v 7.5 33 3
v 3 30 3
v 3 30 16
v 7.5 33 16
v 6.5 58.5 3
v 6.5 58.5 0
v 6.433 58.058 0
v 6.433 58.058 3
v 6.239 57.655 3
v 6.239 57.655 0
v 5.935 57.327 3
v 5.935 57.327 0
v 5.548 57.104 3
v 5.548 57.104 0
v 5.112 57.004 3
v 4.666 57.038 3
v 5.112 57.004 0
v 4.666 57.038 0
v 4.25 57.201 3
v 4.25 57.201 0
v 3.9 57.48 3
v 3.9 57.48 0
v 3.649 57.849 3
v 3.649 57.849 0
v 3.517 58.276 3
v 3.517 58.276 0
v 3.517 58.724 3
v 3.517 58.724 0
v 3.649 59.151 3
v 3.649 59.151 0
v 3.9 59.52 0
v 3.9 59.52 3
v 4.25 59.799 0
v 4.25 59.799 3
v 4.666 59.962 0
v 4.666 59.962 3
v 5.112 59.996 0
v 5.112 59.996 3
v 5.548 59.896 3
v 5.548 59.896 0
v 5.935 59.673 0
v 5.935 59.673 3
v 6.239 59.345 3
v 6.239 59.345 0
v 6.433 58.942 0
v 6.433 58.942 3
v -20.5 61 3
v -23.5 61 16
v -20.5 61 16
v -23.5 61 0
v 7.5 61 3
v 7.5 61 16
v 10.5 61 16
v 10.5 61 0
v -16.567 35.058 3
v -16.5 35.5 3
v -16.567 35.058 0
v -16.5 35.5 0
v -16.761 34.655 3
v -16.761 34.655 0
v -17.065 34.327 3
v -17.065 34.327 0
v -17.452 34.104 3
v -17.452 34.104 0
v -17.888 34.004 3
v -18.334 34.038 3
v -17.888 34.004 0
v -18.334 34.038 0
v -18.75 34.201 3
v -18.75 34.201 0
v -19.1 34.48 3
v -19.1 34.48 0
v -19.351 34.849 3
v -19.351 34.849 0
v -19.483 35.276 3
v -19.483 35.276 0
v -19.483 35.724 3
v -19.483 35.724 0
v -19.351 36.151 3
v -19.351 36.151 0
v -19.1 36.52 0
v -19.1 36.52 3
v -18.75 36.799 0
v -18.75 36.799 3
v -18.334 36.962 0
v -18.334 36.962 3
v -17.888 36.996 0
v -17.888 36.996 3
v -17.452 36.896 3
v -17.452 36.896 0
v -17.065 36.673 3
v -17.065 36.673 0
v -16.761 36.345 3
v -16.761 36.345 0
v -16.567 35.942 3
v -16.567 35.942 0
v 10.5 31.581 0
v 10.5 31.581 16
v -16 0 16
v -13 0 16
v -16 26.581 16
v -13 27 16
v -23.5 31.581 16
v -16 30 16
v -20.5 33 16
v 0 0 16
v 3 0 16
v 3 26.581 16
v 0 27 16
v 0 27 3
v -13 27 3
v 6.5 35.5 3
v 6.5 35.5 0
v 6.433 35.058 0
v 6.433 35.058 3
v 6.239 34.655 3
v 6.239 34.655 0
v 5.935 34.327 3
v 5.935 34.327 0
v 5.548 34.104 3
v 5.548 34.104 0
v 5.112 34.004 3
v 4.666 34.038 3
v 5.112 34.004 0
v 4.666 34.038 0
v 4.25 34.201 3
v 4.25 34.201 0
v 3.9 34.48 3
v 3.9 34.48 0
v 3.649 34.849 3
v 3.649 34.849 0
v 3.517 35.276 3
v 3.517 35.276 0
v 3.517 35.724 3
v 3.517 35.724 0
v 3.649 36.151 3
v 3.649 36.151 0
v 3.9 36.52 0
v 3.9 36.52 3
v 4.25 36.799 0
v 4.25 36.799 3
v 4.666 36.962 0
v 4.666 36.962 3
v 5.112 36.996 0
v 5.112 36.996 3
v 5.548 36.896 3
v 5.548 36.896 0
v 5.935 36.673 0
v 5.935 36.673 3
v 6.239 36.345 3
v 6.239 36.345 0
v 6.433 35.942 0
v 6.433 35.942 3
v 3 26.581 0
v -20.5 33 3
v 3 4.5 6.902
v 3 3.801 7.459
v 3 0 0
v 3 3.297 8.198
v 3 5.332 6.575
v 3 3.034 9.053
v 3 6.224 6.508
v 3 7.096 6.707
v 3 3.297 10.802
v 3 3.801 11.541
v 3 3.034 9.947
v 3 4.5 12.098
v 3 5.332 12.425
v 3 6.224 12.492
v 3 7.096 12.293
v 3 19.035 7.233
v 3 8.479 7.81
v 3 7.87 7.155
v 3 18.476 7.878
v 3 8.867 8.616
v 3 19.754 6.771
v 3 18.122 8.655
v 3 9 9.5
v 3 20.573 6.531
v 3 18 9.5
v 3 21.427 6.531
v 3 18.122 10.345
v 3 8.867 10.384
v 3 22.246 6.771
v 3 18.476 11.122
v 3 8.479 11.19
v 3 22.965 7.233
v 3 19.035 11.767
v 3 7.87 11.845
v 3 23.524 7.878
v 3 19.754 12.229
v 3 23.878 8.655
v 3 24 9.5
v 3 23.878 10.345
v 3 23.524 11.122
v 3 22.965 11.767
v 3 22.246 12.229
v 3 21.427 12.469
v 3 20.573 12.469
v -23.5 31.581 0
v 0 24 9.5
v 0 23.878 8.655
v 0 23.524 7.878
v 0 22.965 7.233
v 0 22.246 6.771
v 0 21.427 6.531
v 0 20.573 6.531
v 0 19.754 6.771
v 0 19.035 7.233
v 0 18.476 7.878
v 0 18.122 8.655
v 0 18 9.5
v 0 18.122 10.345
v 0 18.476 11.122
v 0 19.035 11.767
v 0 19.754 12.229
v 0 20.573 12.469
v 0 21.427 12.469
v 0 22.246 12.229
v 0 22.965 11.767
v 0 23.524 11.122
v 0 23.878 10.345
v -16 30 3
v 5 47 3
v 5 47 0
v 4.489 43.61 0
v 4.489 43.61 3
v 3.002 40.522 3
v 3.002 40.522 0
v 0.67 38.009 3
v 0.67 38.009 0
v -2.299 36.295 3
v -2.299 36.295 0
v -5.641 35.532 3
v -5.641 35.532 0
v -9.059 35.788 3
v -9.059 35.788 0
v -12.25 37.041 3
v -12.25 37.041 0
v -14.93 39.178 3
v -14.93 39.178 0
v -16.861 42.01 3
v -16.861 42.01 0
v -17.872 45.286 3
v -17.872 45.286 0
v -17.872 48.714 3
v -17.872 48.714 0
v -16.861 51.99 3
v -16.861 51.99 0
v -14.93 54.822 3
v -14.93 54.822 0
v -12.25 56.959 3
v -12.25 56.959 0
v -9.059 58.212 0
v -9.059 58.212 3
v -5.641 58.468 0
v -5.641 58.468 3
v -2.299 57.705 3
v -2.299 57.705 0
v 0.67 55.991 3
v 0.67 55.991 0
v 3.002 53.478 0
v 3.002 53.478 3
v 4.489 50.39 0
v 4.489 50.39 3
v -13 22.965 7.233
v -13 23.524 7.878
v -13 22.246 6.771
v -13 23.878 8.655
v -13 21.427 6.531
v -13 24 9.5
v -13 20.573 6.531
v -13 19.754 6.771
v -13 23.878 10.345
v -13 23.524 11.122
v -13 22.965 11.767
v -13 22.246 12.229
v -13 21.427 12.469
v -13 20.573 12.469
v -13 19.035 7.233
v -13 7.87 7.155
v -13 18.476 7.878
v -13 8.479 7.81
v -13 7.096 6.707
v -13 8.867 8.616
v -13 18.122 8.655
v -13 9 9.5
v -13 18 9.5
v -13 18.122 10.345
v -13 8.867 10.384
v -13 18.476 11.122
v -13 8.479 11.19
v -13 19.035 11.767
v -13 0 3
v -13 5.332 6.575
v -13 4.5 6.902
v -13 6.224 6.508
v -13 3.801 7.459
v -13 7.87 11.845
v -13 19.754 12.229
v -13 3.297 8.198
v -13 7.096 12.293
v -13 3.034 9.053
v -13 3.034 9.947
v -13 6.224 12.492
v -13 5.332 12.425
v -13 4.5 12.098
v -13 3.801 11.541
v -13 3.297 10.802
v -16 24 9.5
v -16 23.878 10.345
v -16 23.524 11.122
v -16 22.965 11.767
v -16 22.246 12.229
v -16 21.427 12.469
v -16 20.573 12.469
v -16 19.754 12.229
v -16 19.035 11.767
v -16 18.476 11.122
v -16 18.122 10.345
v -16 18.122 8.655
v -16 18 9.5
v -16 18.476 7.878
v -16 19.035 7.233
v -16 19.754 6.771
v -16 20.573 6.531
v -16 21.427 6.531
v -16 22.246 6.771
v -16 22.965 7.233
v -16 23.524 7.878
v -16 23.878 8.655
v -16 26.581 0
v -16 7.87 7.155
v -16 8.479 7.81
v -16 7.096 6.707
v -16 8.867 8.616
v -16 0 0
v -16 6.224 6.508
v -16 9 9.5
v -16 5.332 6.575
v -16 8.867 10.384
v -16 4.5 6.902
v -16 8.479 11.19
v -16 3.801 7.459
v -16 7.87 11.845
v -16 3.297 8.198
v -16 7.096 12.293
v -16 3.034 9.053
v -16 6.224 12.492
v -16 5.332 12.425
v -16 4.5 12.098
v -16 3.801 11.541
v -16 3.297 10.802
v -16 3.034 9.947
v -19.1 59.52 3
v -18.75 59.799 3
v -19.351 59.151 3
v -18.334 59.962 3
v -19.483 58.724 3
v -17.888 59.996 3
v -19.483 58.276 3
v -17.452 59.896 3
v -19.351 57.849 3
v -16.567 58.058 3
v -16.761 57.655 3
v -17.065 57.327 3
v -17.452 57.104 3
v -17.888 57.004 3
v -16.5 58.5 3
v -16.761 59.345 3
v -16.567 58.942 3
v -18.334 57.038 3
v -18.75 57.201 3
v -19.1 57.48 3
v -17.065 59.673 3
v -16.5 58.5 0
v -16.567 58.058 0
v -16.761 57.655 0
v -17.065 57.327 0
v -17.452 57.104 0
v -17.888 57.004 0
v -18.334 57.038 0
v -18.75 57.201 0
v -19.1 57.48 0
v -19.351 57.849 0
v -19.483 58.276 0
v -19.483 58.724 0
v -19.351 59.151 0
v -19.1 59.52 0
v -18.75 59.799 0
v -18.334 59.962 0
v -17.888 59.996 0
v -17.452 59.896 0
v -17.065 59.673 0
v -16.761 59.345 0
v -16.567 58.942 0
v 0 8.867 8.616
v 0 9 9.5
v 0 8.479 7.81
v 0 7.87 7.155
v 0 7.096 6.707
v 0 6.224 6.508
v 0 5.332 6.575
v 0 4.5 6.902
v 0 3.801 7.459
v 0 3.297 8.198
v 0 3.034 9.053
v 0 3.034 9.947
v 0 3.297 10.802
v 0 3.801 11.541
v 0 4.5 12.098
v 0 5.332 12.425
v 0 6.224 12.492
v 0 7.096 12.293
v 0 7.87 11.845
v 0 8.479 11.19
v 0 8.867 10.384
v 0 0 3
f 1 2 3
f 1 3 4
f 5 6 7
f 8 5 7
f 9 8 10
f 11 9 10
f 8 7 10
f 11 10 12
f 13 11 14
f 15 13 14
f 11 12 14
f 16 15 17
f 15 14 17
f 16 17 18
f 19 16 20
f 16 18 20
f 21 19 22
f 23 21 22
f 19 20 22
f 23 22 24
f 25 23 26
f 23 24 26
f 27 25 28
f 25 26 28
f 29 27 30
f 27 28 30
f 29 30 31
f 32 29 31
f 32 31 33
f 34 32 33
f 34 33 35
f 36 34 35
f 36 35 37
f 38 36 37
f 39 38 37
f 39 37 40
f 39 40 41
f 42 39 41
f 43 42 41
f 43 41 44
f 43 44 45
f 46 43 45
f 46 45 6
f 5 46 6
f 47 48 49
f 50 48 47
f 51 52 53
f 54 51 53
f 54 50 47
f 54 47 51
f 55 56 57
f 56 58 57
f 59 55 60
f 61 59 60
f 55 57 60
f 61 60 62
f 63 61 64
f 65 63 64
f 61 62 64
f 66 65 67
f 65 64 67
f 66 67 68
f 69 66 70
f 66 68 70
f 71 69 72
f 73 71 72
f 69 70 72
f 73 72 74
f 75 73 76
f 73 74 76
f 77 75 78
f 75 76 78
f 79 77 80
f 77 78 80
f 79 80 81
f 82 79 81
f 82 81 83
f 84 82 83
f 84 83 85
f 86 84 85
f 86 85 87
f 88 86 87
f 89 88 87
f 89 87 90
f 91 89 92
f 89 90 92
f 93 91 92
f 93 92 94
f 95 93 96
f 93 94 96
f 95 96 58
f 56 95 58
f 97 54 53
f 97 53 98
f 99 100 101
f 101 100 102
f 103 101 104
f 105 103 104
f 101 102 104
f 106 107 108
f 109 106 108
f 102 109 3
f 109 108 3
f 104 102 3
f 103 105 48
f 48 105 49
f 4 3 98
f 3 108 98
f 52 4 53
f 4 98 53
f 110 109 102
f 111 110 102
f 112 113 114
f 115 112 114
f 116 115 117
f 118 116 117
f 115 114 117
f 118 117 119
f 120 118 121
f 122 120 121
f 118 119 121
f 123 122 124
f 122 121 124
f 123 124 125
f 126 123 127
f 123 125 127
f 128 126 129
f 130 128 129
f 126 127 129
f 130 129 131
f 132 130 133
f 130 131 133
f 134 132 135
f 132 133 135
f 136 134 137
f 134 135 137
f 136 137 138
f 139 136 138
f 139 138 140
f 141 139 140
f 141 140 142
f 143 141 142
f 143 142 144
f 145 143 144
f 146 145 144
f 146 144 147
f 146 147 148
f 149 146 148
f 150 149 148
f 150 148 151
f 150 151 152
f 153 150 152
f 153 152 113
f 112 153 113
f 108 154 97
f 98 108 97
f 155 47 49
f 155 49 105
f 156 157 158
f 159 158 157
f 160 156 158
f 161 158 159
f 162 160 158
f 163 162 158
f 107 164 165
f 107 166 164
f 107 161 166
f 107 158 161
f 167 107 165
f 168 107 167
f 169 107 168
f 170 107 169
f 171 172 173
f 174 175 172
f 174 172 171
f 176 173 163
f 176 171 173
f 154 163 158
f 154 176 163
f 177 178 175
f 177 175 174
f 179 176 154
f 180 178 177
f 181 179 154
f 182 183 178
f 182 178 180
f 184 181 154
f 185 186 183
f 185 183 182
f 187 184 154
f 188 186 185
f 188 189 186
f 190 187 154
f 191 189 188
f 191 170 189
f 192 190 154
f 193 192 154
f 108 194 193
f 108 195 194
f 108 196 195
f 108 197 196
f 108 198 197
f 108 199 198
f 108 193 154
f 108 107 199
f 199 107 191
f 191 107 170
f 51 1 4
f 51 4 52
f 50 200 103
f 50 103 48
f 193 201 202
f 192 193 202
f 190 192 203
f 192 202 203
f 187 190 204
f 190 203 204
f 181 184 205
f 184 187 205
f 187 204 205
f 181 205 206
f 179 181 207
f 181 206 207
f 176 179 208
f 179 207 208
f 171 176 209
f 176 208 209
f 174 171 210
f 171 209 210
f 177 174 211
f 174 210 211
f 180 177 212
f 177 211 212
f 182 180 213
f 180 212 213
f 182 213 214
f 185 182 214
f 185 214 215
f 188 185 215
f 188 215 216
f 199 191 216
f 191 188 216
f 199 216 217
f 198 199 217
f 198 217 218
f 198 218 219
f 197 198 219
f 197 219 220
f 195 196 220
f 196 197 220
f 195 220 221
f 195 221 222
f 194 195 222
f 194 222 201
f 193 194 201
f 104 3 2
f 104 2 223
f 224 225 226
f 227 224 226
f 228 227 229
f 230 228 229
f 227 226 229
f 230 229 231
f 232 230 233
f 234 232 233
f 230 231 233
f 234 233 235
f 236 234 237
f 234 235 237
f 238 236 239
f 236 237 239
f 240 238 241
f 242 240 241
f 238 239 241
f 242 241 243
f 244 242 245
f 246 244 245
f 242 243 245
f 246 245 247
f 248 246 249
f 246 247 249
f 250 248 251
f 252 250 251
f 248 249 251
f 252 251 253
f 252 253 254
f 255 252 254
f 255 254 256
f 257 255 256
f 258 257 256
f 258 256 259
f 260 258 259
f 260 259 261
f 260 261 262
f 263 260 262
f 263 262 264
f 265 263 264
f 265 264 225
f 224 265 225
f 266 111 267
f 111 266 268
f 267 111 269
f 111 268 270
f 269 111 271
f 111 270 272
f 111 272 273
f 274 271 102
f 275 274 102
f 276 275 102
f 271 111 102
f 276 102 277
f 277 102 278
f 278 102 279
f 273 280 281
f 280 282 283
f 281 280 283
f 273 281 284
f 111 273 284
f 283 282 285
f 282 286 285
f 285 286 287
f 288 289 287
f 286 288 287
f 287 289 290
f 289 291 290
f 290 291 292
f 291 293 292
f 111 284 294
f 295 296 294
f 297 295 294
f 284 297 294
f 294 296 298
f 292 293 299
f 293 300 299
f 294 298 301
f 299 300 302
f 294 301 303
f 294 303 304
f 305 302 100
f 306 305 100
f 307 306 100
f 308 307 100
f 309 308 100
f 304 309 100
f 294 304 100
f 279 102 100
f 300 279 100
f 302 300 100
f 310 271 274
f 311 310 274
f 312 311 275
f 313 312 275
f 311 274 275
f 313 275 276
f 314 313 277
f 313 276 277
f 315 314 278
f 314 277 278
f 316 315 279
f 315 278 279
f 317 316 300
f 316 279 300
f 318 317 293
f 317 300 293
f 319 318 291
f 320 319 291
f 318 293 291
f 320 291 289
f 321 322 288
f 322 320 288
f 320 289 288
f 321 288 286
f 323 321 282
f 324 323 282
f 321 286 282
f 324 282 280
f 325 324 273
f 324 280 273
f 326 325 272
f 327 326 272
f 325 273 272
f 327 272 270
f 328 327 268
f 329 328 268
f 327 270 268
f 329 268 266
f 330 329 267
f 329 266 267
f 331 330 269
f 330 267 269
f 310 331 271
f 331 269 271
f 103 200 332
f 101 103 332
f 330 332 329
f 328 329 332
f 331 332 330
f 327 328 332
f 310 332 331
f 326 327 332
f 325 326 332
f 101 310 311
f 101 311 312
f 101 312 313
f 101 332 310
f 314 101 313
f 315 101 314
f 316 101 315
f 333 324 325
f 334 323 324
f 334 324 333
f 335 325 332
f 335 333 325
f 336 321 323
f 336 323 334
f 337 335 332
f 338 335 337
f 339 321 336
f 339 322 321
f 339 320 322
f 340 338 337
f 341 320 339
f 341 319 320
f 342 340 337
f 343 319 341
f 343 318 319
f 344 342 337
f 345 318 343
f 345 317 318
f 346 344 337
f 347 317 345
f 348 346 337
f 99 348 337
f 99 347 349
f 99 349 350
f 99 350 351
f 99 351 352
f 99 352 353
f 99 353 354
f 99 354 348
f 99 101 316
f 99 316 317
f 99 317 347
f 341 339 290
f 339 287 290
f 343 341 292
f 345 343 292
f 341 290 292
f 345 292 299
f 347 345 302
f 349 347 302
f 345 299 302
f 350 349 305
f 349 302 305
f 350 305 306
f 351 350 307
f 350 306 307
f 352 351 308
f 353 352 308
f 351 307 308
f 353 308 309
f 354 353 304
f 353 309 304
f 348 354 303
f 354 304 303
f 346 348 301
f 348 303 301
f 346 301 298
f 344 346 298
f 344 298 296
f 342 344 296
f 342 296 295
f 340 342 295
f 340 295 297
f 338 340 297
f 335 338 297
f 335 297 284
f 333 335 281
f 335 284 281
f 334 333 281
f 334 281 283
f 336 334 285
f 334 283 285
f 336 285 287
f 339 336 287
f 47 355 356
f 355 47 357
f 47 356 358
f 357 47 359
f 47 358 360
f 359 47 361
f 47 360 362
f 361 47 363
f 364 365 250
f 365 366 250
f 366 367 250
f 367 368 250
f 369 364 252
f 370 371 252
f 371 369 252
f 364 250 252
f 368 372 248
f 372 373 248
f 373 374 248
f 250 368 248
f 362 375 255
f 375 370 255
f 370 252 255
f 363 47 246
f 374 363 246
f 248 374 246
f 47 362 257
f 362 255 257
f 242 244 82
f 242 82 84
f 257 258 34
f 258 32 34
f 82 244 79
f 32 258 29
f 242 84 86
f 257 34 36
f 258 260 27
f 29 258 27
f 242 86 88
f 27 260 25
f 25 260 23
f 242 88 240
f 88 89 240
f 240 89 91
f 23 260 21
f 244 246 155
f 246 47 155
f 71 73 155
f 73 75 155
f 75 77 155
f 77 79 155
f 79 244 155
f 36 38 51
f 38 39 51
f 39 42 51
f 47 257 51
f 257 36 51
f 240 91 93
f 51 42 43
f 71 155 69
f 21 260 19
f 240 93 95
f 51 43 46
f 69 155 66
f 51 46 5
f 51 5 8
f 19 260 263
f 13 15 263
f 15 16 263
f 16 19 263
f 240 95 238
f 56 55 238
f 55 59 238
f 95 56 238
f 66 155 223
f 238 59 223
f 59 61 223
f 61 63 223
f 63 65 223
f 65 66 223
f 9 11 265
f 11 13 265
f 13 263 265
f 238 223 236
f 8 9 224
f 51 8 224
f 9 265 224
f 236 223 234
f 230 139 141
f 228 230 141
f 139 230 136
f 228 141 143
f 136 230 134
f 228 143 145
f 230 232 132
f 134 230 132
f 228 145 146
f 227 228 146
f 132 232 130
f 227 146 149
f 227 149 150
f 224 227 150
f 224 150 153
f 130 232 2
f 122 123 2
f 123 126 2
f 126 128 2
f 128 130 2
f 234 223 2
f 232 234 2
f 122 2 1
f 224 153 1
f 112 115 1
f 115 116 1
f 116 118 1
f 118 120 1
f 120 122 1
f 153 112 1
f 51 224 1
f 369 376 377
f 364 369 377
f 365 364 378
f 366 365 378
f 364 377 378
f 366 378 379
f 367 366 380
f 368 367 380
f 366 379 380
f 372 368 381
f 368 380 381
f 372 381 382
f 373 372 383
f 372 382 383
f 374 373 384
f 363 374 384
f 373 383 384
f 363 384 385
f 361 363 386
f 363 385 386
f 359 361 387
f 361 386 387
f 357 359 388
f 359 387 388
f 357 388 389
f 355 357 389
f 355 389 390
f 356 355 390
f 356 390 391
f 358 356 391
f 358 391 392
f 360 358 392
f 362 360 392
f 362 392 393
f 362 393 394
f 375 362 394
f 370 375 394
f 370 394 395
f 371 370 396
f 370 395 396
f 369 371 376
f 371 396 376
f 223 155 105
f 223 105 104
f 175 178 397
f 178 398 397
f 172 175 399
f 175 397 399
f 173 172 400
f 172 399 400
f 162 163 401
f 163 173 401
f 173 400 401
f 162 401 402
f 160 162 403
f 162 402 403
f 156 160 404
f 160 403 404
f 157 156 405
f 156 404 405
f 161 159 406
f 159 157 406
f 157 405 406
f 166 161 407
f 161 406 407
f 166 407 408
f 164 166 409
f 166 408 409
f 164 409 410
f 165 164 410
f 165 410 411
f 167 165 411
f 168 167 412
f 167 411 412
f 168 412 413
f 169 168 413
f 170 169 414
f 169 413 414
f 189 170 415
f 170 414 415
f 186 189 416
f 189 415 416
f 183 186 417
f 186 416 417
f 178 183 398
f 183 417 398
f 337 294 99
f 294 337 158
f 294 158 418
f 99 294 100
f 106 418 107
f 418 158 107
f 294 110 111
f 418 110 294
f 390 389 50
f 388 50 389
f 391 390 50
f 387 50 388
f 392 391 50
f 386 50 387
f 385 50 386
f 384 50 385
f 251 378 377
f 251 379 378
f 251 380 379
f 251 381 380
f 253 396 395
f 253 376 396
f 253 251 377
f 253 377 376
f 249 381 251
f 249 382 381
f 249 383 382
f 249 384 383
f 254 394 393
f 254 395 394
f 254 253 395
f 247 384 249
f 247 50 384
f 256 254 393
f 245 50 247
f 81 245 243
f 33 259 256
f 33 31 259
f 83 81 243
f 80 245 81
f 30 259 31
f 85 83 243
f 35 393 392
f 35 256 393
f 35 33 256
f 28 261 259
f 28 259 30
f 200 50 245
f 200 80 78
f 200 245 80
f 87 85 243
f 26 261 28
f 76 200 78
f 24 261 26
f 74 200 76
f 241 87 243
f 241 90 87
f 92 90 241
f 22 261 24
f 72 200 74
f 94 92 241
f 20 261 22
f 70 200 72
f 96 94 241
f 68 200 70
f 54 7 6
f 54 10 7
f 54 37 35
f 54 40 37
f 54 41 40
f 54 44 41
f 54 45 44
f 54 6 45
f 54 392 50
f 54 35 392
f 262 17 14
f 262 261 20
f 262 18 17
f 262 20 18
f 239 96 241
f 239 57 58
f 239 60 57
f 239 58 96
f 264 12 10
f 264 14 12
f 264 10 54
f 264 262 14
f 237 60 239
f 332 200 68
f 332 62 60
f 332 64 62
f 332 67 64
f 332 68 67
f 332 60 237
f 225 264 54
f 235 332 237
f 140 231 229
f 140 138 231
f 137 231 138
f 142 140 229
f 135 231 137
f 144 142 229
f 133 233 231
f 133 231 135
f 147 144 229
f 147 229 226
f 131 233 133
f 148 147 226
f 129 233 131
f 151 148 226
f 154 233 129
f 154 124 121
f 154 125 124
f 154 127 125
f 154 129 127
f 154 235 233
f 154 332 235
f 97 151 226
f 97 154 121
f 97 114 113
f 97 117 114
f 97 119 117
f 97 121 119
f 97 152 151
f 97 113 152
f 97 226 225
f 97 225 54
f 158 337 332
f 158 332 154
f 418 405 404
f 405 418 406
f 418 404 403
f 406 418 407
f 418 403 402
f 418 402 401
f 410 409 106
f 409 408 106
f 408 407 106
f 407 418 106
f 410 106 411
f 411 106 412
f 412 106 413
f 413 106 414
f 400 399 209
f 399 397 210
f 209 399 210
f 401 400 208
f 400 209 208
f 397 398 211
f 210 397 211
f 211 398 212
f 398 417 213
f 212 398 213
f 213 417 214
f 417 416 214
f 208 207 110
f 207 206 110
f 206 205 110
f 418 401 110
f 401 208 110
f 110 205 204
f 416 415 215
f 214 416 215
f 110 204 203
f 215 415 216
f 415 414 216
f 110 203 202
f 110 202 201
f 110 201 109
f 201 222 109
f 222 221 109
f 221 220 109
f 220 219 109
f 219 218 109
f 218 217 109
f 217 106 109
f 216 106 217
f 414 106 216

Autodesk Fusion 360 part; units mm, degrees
sketch "Sketch1" plane through (0, 0, 0) normal (1, 0, 0) x (0, 1, 0)
  line L0 (0, 0) -> (27, 0)
  line L1 (27, 0) -> (27, 16)
  line L2 (27, 16) -> (0, 16)
  line L3 (0, 16) -> (0, 0)
  line L4 (0, 9.5) -> (6, 9.5) construction
  line L5 (6, 9.5) -> (6, 16) construction
  circle A0 centre (6, 9.5) radius 3
  line L6 (6, 9.5) -> (21, 9.5)
  circle A1 centre (21, 9.5) radius 3
  dimension "d1_4" = 16
  dimension "d2_4" = 27
  dimension "d3_4" = 6
  dimension "d4_4" = 6.5
  dimension "d5_2" = 6
  dimension "d6_1" = 15
  dimension "d7_2" = 6
extrude "Extrude1" add sketch "Sketch1" along normal blind 3 makes body 1
sketch "Sketch2" plane through (0, 0, 0) normal (-1, 0, 0) x (0, -1, 0)
  circle A0 centre (-21, 9.5) radius 3
  circle A1 centre (-6, 9.5) radius 3
  line L0 (0, 0) -> (0, 16)
  line L1 (0, 16) -> (-27, 16)
  line L2 (-27, 16) -> (-27, 0)
  line L3 (-27, 0) -> (0, 0)
  line L4 (0, 0) -> (-27, 0)
  line L5 (-27, 0) -> (-27, 3)
  line L6 (-27, 3) -> (0, 3)
  line L7 (0, 3) -> (0, 0)
  dimension "d10_1" = 3
extrude "Extrude2" add sketch "Sketch2" along normal blind 13 contours L0 L2 L3 L4 L5 L6 L7 bodies 1
ref_plane "WorkPlane1" through (-6.5, 13.5, 1.5) normal (-1, 0, 0) x (0, 0, 1)
mirror "Mirror1" about plane through (-6.5, 13.5, 1.5) normal (-1, 0, 0) of "Extrude1" makes body 2
combine "Combine1" operation add target body 1 tool bodies 2
sketch "Sketch3" plane through (0, 27, 0) normal (0, 1, 0) x (-1, 0, 0)
  line L0 (0, 3) -> (0, 16)
  line L1 (0, 16) -> (-3, 16)
  line L2 (-3, 16) -> (-3, 0)
  line L3 (-3, 0) -> (16, 0)
  line L4 (16, 0) -> (16, 16)
  line L5 (16, 16) -> (13, 16)
  line L6 (13, 16) -> (13, 3)
  line L7 (13, 3) -> (0, 3)
  line L8 (-3, 16) -> (16, 16)
  line L9 (16, 16) -> (16, 0)
  line L10 (16, 0) -> (-3, 0)
  line L11 (-3, 0) -> (-3, 16)
extrude "Extrude3" add sketch "Sketch3" along normal blind 3 bodies 1
sketch "Sketch4" plane through (0, 0, 0) normal (0, 0, -1) x (1, 0, 0)
  line L0 (3, -30) -> (3, 0)
  line L1 (3, 0) -> (-16, 0)
  line L2 (-16, 0) -> (-16, -30)
  line L3 (-16, -30) -> (3, -30)
  line L4 (-6.5, -30) -> (-6.5, -33) construction
  line L5 (7.5, -33) -> (-20.5, -33) construction
  line L6 (-20.5, -33) -> (-20.5, -61)
  line L7 (-20.5, -61) -> (7.5, -61)
  line L8 (7.5, -61) -> (7.5, -33)
  line L9 (-16, -30) -> (-20.5, -33)
  line L10 (3, -30) -> (7.5, -33)
  circle A0 centre (-6.5, -47) radius 11.5
  line L11 (7.5, -33) -> (-20.5, -61) construction
  line L12 (7.5, -61) -> (-20.5, -33) construction
  dimension "d23" = 28
  dimension "d24" = 28
  dimension "d25" = 3
  dimension "d28" = 23
extrude "Extrude4" add sketch "Sketch4" against normal blind 3 contours L3 L6 L7 L8 L9 L10 bodies 1
sketch "Sketch5" plane through (0, 0, 0) normal (0, 0, -1) x (1, 0, 0)
  circle A0 centre (-6.5, -47) radius 11.5
  line L0 (3, -30) -> (3, 0)
  line L1 (3, 0) -> (-16, 0)
  line L2 (-16, 0) -> (-16, -30)
  line L3 (-16, -30) -> (-20.5, -33)
  line L4 (-20.5, -33) -> (-20.5, -61)
  line L5 (-20.5, -61) -> (7.5, -61)
  line L6 (7.5, -61) -> (7.5, -33)
  line L7 (7.5, -33) -> (3, -30)
  line L8 (7.5, -61) -> (-20.5, -61)
  line L9 (-20.5, -61) -> (-20.5, -33)
  line L10 (-20.5, -33) -> (7.5, -33)
  line L11 (7.5, -33) -> (7.5, -61)
  line L12 (5, -58.5) -> (-18, -58.5) construction
  line L13 (-18, -58.5) -> (-18, -35.5) construction
  line L14 (-18, -35.5) -> (5, -35.5) construction
  line L15 (5, -35.5) -> (5, -58.5) construction
  circle A1 centre (5, -58.5) radius 1.5
  circle A2 centre (-18, -58.5) radius 1.5
  circle A3 centre (5, -35.5) radius 1.5
  circle A4 centre (-18, -35.5) radius 1.5
  dimension "d29" = 23
  dimension "d30" = 23
  dimension "d31" = 2.5
  dimension "d32" = 2.5
  dimension "d33" = 2.5
  dimension "d34" = 2.5
  dimension "d35" = 3
  dimension "d36" = 3
  dimension "d37" = 3
  dimension "d38" = 3
extrude "Extrude5" cut sketch "Sketch5" against normal up to surface (3 mm away) contours A1 | A2 | A3 | A4 bodies 1
sketch "Sketch10" plane through (0, 0, 3) normal (0, 0, 1) x (-1, 0, 0)
  circle A0 centre (-5, -35.5) radius 1.5
  circle A1 centre (18, -35.5) radius 1.5
  circle A2 centre (-5, -58.5) radius 1.5
  circle A3 centre (18, -58.5) radius 1.5
  circle A4 centre (6.5, -47) radius 11.5
  line L0 (20.5, -33) -> (16, -30)
  line L1 (16, -30) -> (-3, -30)
  line L2 (-3, -30) -> (-7.5, -33)
  line L3 (-7.5, -33) -> (-7.5, -61)
  line L4 (-7.5, -61) -> (20.5, -61)
  line L5 (20.5, -61) -> (20.5, -33)
  line L6 (-7.5, -61) -> (-10.5, -61)
  line L7 (-10.5, -61) -> (-10.5, -33)
  line L8 (-3, -26.5806) -> (-10.5, -31.5806)
  line L9 (-10.5, -31.5806) -> (-10.5, -61)
  line L10 (-3, 0) -> (-3, -30)
  line L11 (-7.5, -61) -> (-7.5, -61)
  dimension "d91" = 3
extrude "Extrude8" add sketch "Sketch10" along normal up to surface (13 mm away) and the other way up to surface (3 mm away) contours L2 L3 L6 L7 L8 L9 L10 bodies 1
mirror "Mirror3" about plane through (-6.5, 13.5, 1.5) normal (-1, 0, 0) of "Extrude8"
